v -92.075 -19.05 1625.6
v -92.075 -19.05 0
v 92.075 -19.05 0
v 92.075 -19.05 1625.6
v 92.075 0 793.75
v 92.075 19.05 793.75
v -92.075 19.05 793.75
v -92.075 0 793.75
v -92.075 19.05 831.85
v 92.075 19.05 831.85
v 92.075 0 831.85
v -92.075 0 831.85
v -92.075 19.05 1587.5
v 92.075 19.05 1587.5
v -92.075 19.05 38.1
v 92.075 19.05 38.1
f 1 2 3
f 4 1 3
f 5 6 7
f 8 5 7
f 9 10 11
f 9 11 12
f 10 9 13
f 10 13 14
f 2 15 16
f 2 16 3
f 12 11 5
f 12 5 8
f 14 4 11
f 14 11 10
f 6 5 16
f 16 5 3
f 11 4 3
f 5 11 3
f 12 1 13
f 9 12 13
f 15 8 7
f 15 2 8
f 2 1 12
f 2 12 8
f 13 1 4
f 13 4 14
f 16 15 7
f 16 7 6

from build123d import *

# Parameters (mm, degrees)
F0_W     = 184.15
F0_H     = 38.1
F1_DEPTH = 1625.6
F3_DEPTH = 190.5
F4_W     = 184.15
F4_H     = 38.1
F5_DEPTH = 19.05


with BuildPart() as f1:
    # F0 (on Top) → F1 (new body)
    with BuildSketch(Plane.XY):
        Rectangle(F0_W, F0_H)
    extrude(amount=F1_DEPTH)

    # F2 (on face) → F3 (cut)
    with BuildSketch(Plane.YZ.offset(92.075)):
        Polygon((19.05, 1625.6), (-19.05, 1625.6), (19.05, 1587.5), align=None)
        Polygon((19.05, 38.1), (-19.05, 0), (19.05, 0), align=None)
    extrude(amount=-F3_DEPTH, mode=Mode.SUBTRACT)

    # F4 (on face) → F5 (cut)
    with BuildSketch(Plane(origin=(0, 19.05, 0), x_dir=(-1, 0, 0), z_dir=(0, 1, 0))):
        with Locations((0, 812.8)):
            Rectangle(F4_W, F4_H)
    extrude(amount=-F5_DEPTH, mode=Mode.SUBTRACT)


solid = f1.part
